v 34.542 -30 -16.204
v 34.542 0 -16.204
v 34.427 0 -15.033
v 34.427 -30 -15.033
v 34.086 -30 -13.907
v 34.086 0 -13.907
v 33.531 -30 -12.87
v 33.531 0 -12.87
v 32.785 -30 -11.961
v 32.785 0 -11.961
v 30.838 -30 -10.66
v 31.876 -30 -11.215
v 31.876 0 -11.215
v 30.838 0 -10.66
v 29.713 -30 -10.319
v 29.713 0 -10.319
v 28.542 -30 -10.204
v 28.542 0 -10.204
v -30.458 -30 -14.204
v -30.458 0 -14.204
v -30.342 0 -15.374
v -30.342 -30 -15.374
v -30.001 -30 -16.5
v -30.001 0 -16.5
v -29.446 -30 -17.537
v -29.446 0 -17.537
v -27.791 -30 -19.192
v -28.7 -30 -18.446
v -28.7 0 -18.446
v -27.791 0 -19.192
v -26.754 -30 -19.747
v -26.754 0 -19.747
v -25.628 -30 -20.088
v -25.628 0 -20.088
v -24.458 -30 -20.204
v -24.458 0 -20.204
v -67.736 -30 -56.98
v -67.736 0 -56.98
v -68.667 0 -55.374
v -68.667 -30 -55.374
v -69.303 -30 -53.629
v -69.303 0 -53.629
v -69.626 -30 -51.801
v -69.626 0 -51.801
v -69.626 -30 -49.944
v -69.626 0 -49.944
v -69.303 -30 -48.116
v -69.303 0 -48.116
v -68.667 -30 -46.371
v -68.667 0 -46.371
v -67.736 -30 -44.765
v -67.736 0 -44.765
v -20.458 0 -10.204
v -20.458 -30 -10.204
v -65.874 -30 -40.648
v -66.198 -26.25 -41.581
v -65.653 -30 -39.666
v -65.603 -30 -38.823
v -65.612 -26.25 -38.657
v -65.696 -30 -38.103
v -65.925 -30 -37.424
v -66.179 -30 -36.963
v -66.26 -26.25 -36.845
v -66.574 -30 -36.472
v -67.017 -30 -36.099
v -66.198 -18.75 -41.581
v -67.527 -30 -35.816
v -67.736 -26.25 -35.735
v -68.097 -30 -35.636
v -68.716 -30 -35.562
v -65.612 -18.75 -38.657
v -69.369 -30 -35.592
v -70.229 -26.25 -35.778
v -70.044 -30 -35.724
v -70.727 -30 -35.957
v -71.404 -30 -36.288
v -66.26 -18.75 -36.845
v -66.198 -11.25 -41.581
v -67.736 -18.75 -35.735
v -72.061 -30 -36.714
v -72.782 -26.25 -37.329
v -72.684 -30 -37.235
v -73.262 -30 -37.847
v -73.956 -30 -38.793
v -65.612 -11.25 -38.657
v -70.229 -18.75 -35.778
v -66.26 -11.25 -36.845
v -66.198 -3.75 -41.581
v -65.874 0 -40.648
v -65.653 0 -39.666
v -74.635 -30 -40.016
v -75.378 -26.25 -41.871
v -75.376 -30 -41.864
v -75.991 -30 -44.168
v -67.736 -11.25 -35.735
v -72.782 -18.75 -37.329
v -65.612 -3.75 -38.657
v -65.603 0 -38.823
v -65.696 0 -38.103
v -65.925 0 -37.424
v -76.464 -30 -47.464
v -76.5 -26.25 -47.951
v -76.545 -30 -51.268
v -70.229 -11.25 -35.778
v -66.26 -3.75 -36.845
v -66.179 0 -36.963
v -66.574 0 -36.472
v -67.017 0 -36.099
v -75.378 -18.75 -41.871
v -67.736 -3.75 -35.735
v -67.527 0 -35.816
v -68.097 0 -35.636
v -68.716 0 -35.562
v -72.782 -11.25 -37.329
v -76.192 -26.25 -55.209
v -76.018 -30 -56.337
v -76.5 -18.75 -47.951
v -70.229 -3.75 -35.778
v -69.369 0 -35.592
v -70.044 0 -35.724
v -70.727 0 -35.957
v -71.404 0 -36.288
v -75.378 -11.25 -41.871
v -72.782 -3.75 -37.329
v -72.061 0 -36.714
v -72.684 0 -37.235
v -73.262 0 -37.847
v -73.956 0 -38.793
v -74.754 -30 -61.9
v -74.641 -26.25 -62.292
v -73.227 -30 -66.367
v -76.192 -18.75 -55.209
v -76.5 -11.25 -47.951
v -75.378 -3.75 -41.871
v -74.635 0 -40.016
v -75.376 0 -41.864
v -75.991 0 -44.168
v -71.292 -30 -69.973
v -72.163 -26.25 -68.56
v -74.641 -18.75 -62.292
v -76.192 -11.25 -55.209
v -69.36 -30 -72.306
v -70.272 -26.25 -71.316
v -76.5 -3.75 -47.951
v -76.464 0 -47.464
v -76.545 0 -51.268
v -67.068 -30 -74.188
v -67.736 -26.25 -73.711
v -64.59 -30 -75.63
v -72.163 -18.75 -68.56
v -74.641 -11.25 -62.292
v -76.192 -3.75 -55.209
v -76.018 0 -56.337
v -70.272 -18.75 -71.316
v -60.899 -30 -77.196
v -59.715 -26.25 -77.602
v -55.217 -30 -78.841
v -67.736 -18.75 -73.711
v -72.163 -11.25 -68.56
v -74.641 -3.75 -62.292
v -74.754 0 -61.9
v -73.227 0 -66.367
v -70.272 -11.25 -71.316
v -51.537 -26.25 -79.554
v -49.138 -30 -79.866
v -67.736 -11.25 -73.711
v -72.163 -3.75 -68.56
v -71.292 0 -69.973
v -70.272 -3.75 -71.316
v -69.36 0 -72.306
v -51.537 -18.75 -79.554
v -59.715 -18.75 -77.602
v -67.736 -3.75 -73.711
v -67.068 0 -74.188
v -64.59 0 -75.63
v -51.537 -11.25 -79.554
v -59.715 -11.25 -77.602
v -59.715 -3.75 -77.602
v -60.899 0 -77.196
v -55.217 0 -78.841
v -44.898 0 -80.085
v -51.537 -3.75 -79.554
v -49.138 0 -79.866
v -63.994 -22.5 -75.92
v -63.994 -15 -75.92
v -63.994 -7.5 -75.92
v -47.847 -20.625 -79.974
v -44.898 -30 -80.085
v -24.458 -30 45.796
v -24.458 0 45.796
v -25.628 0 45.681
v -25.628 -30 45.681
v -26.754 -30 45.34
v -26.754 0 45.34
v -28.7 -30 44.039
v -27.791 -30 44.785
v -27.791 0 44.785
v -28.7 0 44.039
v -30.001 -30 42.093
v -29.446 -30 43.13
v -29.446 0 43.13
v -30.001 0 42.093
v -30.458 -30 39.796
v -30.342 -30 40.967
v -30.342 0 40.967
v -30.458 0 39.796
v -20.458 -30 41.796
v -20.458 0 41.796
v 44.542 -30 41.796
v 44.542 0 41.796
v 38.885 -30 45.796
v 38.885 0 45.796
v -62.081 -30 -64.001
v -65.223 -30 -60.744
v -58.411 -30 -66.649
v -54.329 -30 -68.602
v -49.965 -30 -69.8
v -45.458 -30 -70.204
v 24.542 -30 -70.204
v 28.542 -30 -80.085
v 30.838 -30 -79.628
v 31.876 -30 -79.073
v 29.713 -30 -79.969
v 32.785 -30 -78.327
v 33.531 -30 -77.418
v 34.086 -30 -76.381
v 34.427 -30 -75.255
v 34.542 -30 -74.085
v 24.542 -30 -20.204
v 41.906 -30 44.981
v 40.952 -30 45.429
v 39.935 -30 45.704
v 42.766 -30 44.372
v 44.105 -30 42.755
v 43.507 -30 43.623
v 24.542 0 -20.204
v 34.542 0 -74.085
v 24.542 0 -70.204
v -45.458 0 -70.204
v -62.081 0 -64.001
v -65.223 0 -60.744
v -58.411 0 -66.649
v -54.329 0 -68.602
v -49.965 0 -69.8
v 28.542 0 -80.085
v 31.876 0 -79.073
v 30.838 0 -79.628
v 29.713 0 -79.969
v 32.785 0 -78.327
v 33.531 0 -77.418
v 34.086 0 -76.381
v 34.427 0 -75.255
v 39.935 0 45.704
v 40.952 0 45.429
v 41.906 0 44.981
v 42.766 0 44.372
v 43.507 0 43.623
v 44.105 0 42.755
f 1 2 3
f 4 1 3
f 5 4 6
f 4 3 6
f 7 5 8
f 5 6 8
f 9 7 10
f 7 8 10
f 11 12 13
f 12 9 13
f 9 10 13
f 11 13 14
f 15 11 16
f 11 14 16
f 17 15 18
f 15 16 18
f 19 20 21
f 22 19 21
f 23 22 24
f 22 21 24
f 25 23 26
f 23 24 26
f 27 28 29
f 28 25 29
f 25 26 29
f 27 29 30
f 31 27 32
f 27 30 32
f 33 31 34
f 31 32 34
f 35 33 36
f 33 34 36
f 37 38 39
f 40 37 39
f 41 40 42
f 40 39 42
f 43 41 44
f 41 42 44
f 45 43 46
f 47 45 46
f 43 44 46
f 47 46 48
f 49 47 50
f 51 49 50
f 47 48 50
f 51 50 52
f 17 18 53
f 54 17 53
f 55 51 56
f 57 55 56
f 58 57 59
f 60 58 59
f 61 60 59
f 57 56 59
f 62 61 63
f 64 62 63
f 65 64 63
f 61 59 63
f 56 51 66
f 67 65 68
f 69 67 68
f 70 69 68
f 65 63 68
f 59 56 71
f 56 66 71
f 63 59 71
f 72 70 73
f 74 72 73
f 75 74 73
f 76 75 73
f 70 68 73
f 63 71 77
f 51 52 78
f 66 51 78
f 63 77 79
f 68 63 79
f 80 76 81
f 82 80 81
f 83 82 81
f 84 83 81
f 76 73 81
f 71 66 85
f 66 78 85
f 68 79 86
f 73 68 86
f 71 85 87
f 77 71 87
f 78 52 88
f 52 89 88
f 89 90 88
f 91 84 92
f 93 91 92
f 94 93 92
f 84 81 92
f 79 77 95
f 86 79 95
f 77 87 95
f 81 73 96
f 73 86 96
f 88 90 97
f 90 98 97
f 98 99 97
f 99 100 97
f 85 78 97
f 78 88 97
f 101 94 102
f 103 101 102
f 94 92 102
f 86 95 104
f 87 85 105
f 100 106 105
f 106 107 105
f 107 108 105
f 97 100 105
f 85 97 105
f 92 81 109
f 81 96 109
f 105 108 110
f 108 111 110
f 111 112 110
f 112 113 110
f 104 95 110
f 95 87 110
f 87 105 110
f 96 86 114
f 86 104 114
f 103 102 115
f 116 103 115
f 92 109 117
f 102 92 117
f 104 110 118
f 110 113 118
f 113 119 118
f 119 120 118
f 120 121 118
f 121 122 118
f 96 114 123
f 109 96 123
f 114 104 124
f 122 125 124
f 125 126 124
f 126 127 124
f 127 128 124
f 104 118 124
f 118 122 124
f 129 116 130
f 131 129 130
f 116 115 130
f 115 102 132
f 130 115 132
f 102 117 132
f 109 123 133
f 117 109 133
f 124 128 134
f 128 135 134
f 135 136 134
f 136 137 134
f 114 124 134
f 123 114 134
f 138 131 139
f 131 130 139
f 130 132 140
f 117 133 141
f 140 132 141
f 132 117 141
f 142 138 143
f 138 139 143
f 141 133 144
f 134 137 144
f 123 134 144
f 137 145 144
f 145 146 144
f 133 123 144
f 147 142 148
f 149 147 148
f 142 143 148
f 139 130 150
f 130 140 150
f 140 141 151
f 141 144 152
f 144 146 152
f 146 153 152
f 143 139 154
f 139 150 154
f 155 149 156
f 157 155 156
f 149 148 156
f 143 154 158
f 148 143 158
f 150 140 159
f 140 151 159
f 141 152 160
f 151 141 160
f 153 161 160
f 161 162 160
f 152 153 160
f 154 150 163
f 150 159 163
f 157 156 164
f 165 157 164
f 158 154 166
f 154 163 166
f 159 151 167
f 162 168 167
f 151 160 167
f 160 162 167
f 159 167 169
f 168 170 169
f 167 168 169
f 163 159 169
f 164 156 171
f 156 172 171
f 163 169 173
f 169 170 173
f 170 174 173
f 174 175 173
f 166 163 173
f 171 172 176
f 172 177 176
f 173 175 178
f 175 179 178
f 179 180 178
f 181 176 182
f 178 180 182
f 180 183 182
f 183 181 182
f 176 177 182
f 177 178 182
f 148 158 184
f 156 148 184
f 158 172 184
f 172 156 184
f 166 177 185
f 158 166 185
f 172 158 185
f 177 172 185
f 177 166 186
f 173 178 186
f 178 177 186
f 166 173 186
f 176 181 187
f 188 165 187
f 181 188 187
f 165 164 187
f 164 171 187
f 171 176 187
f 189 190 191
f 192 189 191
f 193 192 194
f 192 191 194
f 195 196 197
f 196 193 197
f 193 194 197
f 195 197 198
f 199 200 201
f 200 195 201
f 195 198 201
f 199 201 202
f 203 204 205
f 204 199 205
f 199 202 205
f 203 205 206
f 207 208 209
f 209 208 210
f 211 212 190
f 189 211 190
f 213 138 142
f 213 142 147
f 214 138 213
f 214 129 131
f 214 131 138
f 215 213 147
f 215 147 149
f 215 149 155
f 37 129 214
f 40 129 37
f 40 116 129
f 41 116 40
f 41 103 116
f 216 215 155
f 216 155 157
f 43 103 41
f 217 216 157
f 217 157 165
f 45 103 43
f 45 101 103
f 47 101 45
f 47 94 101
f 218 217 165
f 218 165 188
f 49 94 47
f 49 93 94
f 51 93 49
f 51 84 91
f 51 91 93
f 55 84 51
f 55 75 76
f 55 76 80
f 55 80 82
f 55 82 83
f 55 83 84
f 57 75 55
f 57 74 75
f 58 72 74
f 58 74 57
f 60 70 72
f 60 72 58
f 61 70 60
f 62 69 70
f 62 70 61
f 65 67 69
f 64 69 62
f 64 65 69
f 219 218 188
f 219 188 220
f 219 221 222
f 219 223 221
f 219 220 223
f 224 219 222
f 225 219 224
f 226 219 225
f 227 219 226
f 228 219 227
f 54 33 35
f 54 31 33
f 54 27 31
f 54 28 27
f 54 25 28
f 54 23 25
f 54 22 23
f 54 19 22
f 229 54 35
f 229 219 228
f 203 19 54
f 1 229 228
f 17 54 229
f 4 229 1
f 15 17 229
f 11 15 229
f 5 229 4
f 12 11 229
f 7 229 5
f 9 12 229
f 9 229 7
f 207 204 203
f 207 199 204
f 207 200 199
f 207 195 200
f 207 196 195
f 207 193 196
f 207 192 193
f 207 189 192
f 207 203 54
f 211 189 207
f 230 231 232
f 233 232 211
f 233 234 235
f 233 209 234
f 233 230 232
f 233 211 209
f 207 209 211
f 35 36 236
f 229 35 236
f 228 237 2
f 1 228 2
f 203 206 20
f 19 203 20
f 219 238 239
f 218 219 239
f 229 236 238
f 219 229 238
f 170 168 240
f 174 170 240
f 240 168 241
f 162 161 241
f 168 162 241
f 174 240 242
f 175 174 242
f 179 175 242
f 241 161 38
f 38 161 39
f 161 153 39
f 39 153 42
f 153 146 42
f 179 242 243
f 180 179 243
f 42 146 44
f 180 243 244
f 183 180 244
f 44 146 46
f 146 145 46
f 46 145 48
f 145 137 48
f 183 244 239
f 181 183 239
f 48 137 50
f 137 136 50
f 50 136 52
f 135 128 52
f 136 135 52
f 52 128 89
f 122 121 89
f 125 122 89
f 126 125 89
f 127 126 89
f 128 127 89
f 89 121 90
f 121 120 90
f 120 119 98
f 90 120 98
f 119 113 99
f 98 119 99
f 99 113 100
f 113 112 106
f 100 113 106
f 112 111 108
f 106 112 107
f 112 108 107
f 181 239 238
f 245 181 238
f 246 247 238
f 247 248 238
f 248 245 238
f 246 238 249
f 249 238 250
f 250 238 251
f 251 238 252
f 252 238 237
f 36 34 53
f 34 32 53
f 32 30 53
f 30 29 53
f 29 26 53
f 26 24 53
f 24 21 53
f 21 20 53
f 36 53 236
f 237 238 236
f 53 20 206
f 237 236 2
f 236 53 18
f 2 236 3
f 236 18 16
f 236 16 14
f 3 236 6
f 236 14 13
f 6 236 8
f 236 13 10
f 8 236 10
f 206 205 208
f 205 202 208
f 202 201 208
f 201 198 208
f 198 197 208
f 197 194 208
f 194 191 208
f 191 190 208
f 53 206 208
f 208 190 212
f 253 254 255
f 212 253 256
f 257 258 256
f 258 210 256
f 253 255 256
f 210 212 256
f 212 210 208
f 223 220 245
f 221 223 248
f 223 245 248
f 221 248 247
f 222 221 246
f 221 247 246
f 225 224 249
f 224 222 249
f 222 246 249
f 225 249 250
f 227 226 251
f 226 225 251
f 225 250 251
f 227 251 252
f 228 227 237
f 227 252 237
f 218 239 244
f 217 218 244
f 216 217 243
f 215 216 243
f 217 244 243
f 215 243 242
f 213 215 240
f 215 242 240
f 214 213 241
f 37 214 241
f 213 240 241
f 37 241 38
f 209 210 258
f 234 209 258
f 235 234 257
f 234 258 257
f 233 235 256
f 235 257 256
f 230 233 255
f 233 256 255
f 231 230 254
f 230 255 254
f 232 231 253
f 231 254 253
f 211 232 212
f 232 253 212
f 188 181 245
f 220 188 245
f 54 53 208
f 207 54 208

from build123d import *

# Parameters (mm, degrees)
F1_DEPTH    = 30
F2_T1_DEPTH = 60
F2_T3_DEPTH = 58.2842712475


# Not quite as in the source:
# - a fillet or chamfer that OpenCascade refuses, or shapes differently, is made with other operations: its cross-section is extruded or revolved along the edge and cut away or added


with BuildPart() as f1:
    # F0 (on Front) → F1 (new body)
    with BuildSketch(Plane.XZ):
        with BuildLine():
            Line((-20.4576485604, 41.7964319587), (44.5423514396, 41.7964319587))
            Line((44.5423514396, 41.7964319587), (44.5423514396, 45.7964319587))
            Line((44.5423514396, 45.7964319587), (-30.4576485604, 45.7964319587))
            Line((-30.4576485604, 45.7964319587), (-30.4576485604, -20.2035680413))
            Line((-30.4576485604, -20.2035680413), (24.5423514396, -20.2035680413))
            Line((24.5423514396, -20.2035680413), (24.5423514396, -70.2035680413))
            Line((24.5423514396, -70.2035680413), (-45.4576485604, -70.2035680413))
            ThreePointArc((-45.4576485604, -70.2035680413), (-58.4112677552, -66.6488561684), (-67.7362307906, -56.9804906845))
            ThreePointArc((-67.7362307906, -56.9804906845), (-69.6667608001, -50.8724953979), (-67.7362307906, -44.7645001113))
            add(Edge.make_bspline(
                [(-67.7362307906, -44.7645001113), (-66.6047282738, -42.6134626855), (-64.6275870644, -38.8548278844), (-67.5118728603, -34.7496923274), (-74.2171267591, -36.6728128022), (-77.5629423301, -48.422372807), (-75.1680740571, -62.4394566894), (-69.641186524, -75.442468141), (-51.6938526184, -79.943801044), (-46.7813036843, -80.045612986), (-44.8976382613, -80.0846517086)],
                knots=[0, 0, 0, 0, 0.1047159829, 0.1829764247, 0.2776975731, 0.4158396611, 0.5724266185, 0.7228497918, 0.8937296562, 1, 1, 1, 1], degree=3))
            Line((-44.8976382613, -80.0846517086), (34.5423514396, -80.0846517086))
            Line((34.5423514396, -80.0846517086), (34.5423514396, -10.2035680413))
            Line((34.5423514396, -10.2035680413), (-20.4576485604, -10.2035680413))
            Line((-20.4576485604, -10.2035680413), (-20.4576485604, 41.7964319587))
        make_face()
    extrude(amount=F1_DEPTH)

    # F2: fillet of radius 6 on 5 edges, made by hand

    # F2_s2 → F2_t1 (cut)
    with BuildSketch(Plane.XZ.offset(-15)):
        with BuildLine():
            ThreePointArc((-24.4576485604, 45.7964319587), (-28.7002892475, 44.0390726458), (-30.4576485604, 39.7964319587))
            Line((-30.4576485604, 39.7964319587), (-30.4576485604, 45.7964319587))
            Line((-30.4576485604, 45.7964319587), (-24.4576485604, 45.7964319587))
        make_face()
        with BuildLine():
            ThreePointArc((-30.4576485604, -14.2035680413), (-28.7002892475, -18.4462087284), (-24.4576485604, -20.2035680413))
            Line((-24.4576485604, -20.2035680413), (-30.4576485604, -20.2035680413))
            Line((-30.4576485604, -20.2035680413), (-30.4576485604, -14.2035680413))
        make_face()
        with BuildLine():
            ThreePointArc((34.5423514396, -16.2035680413), (32.7849921267, -11.9609273542), (28.5423514396, -10.2035680413))
            Line((28.5423514396, -10.2035680413), (34.5423514396, -10.2035680413))
            Line((34.5423514396, -10.2035680413), (34.5423514396, -16.2035680413))
        make_face()
        with BuildLine():
            ThreePointArc((28.5423514396, -80.0846517086), (32.7849921267, -78.3272923957), (34.5423514396, -74.0846517086))
            Line((34.5423514396, -74.0846517086), (34.5423514396, -80.0846517086))
            Line((34.5423514396, -80.0846517086), (28.5423514396, -80.0846517086))
        make_face()
    extrude(amount=F2_T1_DEPTH, mode=Mode.SUBTRACT)

    # F2_s4 → F2_t3 (cut)
    with BuildSketch(Plane.XZ.offset(-14.1421356237)):
        with BuildLine():
            ThreePointArc((44.5423514396, 41.7964319587), (42.3495988052, 44.6954114442), (38.8854971901, 45.7964319587))
            Line((38.8854971901, 45.7964319587), (44.5423514396, 45.7964319587))
            Line((44.5423514396, 45.7964319587), (44.5423514396, 41.7964319587))
        make_face()
    extrude(amount=F2_T3_DEPTH, mode=Mode.SUBTRACT)


solid = f1.part
